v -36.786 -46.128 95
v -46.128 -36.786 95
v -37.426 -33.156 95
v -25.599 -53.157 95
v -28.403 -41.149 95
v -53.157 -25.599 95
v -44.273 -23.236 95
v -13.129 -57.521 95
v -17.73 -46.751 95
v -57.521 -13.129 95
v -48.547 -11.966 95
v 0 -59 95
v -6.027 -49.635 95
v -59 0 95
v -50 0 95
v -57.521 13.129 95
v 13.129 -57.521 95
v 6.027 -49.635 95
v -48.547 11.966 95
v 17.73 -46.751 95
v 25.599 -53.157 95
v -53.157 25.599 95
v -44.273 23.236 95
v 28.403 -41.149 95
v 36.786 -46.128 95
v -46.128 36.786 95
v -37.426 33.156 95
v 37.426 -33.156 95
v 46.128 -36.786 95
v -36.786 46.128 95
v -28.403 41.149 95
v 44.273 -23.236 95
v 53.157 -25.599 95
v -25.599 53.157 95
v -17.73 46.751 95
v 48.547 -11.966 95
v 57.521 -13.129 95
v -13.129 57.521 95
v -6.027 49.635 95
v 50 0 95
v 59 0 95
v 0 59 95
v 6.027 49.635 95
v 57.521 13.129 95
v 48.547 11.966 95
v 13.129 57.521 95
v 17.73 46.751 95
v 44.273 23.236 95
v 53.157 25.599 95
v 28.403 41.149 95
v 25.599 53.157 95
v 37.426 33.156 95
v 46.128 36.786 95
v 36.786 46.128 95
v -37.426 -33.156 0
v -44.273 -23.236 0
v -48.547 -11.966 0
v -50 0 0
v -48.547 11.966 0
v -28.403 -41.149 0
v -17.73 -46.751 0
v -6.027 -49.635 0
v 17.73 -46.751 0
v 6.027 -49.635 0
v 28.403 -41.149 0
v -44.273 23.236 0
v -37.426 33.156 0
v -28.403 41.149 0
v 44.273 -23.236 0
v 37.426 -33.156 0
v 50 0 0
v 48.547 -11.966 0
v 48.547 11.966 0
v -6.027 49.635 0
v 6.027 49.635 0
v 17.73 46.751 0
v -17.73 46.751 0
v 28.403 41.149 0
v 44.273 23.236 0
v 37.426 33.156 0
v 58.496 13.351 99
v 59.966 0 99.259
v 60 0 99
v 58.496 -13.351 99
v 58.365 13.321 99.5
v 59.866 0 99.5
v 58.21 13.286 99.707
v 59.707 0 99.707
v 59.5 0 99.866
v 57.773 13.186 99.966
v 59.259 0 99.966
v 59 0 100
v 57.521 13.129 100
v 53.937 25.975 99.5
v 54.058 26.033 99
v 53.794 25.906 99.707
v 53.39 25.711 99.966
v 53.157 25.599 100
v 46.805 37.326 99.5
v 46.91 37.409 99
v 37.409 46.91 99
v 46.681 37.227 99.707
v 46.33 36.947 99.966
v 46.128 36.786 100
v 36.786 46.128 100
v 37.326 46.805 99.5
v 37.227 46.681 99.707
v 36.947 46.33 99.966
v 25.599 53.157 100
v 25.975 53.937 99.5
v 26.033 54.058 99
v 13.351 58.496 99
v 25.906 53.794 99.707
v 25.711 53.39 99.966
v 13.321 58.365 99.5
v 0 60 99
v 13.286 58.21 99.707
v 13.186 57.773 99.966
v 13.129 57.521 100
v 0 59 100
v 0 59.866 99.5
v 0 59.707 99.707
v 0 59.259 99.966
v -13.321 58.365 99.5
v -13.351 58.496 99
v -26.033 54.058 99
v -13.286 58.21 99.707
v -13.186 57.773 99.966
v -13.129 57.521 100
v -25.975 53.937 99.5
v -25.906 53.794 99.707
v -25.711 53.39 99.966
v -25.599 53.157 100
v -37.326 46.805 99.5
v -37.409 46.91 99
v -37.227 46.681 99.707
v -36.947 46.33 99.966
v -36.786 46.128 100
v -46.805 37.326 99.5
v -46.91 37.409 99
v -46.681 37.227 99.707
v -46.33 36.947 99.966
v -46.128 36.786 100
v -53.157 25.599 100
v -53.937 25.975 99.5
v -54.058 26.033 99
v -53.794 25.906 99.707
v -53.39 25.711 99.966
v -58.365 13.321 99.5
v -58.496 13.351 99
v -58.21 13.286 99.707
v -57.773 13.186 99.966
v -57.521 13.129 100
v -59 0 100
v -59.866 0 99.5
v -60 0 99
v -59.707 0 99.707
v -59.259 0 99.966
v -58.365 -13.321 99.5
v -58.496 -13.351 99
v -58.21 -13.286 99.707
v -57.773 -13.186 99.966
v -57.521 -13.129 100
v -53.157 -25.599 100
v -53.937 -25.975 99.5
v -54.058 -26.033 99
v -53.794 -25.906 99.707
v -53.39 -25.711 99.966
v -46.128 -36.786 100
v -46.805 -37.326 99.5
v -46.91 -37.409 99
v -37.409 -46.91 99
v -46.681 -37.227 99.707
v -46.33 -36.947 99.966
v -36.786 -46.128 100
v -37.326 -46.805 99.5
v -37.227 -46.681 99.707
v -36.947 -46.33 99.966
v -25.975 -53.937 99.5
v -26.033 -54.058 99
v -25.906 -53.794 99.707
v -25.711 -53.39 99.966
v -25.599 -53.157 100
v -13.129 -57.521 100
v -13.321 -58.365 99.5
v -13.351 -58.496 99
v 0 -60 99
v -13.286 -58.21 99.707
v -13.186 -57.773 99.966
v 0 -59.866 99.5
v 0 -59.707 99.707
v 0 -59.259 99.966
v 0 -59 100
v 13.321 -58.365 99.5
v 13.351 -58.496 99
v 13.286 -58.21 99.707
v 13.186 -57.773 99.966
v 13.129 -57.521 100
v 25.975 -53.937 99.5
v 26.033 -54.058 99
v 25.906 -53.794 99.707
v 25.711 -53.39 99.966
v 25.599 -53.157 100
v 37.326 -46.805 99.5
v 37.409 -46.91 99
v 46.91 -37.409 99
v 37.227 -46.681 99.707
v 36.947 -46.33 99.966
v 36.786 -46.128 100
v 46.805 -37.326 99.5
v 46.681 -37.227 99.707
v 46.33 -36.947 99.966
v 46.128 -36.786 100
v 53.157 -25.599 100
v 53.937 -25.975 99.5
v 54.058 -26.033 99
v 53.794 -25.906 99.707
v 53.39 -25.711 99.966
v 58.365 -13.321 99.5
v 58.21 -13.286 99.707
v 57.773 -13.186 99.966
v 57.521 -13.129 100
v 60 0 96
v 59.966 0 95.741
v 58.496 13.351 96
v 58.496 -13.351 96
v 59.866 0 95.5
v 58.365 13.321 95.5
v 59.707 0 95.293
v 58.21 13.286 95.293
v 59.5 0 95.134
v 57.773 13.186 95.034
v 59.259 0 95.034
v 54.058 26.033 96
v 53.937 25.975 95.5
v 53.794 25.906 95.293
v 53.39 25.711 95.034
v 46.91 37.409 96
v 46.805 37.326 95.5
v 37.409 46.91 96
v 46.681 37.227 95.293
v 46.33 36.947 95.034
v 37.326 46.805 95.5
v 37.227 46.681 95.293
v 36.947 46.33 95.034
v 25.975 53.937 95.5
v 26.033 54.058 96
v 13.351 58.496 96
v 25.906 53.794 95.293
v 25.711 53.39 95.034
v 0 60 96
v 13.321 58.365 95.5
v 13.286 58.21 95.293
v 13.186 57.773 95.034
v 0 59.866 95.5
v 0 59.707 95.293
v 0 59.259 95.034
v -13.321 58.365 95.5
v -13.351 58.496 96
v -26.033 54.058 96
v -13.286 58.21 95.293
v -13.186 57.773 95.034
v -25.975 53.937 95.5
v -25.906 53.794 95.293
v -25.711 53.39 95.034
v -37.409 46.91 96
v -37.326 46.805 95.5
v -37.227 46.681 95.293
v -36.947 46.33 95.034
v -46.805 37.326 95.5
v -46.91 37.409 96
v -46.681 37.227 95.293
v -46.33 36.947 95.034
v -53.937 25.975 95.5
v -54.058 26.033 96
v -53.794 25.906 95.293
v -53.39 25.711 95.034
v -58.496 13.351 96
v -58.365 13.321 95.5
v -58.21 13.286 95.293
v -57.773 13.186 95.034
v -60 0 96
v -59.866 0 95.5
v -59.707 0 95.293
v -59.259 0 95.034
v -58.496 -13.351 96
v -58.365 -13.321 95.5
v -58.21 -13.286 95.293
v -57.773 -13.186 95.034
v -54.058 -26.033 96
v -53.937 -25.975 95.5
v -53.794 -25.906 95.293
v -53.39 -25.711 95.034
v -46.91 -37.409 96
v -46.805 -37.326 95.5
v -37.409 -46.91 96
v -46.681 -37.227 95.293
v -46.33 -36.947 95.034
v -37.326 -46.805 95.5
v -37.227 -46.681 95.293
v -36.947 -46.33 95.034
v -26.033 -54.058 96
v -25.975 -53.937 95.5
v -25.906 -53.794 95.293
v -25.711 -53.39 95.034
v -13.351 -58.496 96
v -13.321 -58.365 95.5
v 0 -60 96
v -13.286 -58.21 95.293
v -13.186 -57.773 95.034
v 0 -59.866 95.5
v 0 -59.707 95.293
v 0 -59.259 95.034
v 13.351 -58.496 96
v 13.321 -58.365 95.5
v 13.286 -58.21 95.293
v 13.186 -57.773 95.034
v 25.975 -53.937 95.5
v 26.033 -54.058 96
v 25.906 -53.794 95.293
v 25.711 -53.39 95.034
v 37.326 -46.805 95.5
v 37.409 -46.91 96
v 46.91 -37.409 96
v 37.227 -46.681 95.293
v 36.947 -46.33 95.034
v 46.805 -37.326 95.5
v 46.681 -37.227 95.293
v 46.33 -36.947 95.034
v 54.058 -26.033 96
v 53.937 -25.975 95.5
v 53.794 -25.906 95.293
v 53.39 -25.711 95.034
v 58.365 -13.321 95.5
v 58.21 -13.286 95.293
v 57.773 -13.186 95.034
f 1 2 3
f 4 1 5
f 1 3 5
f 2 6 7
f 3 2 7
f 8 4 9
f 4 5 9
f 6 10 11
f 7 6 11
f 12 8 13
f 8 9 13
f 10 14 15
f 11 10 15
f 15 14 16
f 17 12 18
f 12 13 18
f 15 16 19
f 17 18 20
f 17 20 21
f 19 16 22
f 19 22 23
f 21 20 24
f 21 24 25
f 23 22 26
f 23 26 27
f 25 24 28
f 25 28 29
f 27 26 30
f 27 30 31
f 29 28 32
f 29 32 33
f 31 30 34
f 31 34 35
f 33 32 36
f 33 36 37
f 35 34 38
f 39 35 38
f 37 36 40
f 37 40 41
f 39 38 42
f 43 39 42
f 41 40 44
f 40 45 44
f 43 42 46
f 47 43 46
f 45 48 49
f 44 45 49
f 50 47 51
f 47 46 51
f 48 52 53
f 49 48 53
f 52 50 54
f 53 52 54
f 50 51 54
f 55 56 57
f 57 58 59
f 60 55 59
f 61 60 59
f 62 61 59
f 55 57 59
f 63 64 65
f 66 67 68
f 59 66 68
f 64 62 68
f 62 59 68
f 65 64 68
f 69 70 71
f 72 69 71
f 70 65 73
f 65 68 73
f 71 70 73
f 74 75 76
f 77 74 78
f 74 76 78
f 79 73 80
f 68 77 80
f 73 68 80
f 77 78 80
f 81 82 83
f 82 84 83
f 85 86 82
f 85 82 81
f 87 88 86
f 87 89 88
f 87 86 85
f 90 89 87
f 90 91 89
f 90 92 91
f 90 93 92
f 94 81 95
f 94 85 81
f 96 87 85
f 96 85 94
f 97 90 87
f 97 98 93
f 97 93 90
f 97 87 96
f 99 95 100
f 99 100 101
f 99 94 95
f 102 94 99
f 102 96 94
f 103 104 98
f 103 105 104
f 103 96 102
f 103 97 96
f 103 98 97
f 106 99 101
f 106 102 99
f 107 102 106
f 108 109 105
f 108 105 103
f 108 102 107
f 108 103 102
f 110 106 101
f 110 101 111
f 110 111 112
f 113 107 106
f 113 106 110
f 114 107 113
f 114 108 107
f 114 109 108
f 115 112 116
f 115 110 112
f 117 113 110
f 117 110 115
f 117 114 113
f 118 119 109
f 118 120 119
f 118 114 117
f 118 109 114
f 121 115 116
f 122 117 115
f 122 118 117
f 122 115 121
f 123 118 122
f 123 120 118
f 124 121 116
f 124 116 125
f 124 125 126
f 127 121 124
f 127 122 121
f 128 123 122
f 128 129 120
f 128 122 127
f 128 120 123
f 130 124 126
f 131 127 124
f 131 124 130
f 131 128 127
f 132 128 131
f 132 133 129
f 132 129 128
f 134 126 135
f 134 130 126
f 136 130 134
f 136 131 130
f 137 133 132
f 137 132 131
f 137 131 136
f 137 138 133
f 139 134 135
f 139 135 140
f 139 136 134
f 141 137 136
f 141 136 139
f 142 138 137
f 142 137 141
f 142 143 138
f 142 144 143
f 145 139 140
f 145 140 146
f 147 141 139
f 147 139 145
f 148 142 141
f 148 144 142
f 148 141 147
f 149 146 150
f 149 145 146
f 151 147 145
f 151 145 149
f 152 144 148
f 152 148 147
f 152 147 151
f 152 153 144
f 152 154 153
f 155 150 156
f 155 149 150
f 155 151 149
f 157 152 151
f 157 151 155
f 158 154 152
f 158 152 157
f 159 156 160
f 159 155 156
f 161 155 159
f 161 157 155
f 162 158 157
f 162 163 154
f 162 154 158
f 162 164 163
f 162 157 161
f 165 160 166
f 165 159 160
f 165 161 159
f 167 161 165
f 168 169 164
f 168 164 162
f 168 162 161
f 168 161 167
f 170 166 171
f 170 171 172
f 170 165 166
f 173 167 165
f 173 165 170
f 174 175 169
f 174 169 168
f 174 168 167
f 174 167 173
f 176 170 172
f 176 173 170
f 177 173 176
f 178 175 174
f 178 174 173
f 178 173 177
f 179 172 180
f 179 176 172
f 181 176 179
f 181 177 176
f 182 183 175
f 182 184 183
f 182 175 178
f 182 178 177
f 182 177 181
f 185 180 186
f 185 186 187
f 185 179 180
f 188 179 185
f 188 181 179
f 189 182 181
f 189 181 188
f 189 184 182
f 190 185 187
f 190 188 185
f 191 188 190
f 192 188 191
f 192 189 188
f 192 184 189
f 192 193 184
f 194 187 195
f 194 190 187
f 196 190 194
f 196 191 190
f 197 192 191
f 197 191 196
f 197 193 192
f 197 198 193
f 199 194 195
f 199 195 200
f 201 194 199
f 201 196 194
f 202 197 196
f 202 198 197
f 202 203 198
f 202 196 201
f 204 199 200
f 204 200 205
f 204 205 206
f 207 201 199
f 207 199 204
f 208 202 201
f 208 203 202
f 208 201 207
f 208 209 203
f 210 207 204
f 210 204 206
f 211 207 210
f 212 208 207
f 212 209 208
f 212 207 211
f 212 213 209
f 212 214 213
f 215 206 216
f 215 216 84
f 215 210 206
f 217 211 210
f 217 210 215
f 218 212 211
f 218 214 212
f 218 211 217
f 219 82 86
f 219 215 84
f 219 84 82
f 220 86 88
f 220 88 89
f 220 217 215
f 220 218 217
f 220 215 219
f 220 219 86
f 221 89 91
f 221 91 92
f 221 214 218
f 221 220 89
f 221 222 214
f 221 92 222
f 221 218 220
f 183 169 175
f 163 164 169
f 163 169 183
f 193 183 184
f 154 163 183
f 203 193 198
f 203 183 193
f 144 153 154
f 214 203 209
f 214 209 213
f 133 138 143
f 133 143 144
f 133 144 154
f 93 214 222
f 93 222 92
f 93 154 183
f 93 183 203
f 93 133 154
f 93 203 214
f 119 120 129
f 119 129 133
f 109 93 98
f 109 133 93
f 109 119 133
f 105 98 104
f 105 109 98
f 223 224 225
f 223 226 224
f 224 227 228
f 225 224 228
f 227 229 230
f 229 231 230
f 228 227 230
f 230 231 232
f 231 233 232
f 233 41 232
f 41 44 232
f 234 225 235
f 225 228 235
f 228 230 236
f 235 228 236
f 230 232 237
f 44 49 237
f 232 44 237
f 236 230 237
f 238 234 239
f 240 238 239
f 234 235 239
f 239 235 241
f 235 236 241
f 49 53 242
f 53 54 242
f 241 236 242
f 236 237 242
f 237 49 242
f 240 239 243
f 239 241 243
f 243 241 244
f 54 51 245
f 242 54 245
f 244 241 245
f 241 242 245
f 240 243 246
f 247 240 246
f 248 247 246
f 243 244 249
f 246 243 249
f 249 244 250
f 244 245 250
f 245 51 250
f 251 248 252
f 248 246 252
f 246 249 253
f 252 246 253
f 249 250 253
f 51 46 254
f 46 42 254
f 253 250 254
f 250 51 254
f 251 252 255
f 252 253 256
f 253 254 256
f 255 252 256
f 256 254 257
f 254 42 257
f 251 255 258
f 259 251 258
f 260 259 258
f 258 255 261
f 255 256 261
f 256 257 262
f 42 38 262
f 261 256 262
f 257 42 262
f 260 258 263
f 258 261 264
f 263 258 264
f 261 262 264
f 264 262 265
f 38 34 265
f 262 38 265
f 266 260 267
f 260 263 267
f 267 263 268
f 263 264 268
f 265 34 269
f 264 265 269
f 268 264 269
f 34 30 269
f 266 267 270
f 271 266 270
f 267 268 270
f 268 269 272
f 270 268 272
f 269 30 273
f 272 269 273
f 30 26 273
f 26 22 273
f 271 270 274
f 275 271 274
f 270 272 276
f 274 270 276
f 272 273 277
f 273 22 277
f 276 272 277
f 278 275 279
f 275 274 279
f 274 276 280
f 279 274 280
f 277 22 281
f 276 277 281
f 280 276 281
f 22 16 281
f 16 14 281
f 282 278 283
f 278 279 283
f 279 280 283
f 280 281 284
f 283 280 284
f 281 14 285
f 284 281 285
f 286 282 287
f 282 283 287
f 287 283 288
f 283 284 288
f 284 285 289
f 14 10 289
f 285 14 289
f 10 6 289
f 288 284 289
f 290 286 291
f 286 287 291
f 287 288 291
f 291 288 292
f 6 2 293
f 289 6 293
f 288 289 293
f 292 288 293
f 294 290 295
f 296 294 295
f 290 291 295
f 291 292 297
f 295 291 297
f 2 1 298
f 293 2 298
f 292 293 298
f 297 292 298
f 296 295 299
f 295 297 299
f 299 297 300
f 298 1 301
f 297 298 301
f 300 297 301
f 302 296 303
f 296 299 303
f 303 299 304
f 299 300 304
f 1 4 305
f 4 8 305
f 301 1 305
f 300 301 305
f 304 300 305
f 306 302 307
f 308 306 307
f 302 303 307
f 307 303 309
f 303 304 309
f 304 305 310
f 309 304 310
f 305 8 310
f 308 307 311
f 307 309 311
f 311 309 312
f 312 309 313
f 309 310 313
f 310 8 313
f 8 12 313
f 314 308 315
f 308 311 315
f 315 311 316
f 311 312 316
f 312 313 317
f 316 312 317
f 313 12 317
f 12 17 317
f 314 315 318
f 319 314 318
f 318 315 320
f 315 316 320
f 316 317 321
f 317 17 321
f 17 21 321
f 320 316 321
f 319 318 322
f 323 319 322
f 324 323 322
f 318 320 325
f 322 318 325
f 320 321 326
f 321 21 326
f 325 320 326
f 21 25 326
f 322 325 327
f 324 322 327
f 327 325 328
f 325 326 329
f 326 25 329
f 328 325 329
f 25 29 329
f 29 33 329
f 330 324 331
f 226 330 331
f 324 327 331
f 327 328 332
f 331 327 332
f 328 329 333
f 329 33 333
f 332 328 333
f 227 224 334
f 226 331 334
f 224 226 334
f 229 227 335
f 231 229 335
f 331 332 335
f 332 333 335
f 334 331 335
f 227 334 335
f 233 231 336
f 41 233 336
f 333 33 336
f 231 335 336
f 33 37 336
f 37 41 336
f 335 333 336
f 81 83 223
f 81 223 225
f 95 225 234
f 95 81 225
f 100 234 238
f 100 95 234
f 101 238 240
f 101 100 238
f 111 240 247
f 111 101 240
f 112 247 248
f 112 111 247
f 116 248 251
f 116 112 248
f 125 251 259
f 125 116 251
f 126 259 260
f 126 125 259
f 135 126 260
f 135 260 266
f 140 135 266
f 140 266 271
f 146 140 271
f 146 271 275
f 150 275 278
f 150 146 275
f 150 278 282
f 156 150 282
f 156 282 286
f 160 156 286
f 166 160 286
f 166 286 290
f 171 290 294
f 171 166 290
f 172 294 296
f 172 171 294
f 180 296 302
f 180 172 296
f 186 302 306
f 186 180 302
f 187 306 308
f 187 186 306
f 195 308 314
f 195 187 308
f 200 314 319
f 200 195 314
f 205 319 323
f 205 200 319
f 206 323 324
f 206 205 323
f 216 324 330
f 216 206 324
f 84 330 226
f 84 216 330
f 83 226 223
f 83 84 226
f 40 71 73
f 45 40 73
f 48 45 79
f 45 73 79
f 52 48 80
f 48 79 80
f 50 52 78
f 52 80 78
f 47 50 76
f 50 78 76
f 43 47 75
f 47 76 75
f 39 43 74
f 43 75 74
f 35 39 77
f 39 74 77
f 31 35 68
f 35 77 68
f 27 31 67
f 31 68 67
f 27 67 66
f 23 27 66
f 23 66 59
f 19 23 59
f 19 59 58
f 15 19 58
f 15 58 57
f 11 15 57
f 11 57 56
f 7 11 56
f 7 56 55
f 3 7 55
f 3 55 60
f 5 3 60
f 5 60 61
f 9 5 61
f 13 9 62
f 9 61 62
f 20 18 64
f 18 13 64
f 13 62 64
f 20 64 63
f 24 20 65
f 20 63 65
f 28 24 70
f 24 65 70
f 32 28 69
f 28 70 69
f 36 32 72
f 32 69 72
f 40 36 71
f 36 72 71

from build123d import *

# Parameters (mm, degrees)
F0_R     = 50
F1_DEPTH = 100
F2_R     = 60
F3_DEPTH = 5
F4_R     = 1


with BuildPart() as f1:
    # F0 (on Top) → F1 (new body)
    with BuildSketch(Plane.XY):
        Circle(F0_R)
    extrude(amount=F1_DEPTH)

    # F2 (on face) → F3 (join)
    with BuildSketch(Plane.XY.offset(100)):
        Circle(F2_R)
    extrude(amount=-F3_DEPTH)

    # F4
    f4_edges = [f1.edges().sort_by_distance(p)[0] for p in [
        (60, 0, 97.5),
        (-60, 0, 100),
        (-60, 0, 95),
    ]]
    fillet(f4_edges, radius=F4_R)


solid = f1.part
